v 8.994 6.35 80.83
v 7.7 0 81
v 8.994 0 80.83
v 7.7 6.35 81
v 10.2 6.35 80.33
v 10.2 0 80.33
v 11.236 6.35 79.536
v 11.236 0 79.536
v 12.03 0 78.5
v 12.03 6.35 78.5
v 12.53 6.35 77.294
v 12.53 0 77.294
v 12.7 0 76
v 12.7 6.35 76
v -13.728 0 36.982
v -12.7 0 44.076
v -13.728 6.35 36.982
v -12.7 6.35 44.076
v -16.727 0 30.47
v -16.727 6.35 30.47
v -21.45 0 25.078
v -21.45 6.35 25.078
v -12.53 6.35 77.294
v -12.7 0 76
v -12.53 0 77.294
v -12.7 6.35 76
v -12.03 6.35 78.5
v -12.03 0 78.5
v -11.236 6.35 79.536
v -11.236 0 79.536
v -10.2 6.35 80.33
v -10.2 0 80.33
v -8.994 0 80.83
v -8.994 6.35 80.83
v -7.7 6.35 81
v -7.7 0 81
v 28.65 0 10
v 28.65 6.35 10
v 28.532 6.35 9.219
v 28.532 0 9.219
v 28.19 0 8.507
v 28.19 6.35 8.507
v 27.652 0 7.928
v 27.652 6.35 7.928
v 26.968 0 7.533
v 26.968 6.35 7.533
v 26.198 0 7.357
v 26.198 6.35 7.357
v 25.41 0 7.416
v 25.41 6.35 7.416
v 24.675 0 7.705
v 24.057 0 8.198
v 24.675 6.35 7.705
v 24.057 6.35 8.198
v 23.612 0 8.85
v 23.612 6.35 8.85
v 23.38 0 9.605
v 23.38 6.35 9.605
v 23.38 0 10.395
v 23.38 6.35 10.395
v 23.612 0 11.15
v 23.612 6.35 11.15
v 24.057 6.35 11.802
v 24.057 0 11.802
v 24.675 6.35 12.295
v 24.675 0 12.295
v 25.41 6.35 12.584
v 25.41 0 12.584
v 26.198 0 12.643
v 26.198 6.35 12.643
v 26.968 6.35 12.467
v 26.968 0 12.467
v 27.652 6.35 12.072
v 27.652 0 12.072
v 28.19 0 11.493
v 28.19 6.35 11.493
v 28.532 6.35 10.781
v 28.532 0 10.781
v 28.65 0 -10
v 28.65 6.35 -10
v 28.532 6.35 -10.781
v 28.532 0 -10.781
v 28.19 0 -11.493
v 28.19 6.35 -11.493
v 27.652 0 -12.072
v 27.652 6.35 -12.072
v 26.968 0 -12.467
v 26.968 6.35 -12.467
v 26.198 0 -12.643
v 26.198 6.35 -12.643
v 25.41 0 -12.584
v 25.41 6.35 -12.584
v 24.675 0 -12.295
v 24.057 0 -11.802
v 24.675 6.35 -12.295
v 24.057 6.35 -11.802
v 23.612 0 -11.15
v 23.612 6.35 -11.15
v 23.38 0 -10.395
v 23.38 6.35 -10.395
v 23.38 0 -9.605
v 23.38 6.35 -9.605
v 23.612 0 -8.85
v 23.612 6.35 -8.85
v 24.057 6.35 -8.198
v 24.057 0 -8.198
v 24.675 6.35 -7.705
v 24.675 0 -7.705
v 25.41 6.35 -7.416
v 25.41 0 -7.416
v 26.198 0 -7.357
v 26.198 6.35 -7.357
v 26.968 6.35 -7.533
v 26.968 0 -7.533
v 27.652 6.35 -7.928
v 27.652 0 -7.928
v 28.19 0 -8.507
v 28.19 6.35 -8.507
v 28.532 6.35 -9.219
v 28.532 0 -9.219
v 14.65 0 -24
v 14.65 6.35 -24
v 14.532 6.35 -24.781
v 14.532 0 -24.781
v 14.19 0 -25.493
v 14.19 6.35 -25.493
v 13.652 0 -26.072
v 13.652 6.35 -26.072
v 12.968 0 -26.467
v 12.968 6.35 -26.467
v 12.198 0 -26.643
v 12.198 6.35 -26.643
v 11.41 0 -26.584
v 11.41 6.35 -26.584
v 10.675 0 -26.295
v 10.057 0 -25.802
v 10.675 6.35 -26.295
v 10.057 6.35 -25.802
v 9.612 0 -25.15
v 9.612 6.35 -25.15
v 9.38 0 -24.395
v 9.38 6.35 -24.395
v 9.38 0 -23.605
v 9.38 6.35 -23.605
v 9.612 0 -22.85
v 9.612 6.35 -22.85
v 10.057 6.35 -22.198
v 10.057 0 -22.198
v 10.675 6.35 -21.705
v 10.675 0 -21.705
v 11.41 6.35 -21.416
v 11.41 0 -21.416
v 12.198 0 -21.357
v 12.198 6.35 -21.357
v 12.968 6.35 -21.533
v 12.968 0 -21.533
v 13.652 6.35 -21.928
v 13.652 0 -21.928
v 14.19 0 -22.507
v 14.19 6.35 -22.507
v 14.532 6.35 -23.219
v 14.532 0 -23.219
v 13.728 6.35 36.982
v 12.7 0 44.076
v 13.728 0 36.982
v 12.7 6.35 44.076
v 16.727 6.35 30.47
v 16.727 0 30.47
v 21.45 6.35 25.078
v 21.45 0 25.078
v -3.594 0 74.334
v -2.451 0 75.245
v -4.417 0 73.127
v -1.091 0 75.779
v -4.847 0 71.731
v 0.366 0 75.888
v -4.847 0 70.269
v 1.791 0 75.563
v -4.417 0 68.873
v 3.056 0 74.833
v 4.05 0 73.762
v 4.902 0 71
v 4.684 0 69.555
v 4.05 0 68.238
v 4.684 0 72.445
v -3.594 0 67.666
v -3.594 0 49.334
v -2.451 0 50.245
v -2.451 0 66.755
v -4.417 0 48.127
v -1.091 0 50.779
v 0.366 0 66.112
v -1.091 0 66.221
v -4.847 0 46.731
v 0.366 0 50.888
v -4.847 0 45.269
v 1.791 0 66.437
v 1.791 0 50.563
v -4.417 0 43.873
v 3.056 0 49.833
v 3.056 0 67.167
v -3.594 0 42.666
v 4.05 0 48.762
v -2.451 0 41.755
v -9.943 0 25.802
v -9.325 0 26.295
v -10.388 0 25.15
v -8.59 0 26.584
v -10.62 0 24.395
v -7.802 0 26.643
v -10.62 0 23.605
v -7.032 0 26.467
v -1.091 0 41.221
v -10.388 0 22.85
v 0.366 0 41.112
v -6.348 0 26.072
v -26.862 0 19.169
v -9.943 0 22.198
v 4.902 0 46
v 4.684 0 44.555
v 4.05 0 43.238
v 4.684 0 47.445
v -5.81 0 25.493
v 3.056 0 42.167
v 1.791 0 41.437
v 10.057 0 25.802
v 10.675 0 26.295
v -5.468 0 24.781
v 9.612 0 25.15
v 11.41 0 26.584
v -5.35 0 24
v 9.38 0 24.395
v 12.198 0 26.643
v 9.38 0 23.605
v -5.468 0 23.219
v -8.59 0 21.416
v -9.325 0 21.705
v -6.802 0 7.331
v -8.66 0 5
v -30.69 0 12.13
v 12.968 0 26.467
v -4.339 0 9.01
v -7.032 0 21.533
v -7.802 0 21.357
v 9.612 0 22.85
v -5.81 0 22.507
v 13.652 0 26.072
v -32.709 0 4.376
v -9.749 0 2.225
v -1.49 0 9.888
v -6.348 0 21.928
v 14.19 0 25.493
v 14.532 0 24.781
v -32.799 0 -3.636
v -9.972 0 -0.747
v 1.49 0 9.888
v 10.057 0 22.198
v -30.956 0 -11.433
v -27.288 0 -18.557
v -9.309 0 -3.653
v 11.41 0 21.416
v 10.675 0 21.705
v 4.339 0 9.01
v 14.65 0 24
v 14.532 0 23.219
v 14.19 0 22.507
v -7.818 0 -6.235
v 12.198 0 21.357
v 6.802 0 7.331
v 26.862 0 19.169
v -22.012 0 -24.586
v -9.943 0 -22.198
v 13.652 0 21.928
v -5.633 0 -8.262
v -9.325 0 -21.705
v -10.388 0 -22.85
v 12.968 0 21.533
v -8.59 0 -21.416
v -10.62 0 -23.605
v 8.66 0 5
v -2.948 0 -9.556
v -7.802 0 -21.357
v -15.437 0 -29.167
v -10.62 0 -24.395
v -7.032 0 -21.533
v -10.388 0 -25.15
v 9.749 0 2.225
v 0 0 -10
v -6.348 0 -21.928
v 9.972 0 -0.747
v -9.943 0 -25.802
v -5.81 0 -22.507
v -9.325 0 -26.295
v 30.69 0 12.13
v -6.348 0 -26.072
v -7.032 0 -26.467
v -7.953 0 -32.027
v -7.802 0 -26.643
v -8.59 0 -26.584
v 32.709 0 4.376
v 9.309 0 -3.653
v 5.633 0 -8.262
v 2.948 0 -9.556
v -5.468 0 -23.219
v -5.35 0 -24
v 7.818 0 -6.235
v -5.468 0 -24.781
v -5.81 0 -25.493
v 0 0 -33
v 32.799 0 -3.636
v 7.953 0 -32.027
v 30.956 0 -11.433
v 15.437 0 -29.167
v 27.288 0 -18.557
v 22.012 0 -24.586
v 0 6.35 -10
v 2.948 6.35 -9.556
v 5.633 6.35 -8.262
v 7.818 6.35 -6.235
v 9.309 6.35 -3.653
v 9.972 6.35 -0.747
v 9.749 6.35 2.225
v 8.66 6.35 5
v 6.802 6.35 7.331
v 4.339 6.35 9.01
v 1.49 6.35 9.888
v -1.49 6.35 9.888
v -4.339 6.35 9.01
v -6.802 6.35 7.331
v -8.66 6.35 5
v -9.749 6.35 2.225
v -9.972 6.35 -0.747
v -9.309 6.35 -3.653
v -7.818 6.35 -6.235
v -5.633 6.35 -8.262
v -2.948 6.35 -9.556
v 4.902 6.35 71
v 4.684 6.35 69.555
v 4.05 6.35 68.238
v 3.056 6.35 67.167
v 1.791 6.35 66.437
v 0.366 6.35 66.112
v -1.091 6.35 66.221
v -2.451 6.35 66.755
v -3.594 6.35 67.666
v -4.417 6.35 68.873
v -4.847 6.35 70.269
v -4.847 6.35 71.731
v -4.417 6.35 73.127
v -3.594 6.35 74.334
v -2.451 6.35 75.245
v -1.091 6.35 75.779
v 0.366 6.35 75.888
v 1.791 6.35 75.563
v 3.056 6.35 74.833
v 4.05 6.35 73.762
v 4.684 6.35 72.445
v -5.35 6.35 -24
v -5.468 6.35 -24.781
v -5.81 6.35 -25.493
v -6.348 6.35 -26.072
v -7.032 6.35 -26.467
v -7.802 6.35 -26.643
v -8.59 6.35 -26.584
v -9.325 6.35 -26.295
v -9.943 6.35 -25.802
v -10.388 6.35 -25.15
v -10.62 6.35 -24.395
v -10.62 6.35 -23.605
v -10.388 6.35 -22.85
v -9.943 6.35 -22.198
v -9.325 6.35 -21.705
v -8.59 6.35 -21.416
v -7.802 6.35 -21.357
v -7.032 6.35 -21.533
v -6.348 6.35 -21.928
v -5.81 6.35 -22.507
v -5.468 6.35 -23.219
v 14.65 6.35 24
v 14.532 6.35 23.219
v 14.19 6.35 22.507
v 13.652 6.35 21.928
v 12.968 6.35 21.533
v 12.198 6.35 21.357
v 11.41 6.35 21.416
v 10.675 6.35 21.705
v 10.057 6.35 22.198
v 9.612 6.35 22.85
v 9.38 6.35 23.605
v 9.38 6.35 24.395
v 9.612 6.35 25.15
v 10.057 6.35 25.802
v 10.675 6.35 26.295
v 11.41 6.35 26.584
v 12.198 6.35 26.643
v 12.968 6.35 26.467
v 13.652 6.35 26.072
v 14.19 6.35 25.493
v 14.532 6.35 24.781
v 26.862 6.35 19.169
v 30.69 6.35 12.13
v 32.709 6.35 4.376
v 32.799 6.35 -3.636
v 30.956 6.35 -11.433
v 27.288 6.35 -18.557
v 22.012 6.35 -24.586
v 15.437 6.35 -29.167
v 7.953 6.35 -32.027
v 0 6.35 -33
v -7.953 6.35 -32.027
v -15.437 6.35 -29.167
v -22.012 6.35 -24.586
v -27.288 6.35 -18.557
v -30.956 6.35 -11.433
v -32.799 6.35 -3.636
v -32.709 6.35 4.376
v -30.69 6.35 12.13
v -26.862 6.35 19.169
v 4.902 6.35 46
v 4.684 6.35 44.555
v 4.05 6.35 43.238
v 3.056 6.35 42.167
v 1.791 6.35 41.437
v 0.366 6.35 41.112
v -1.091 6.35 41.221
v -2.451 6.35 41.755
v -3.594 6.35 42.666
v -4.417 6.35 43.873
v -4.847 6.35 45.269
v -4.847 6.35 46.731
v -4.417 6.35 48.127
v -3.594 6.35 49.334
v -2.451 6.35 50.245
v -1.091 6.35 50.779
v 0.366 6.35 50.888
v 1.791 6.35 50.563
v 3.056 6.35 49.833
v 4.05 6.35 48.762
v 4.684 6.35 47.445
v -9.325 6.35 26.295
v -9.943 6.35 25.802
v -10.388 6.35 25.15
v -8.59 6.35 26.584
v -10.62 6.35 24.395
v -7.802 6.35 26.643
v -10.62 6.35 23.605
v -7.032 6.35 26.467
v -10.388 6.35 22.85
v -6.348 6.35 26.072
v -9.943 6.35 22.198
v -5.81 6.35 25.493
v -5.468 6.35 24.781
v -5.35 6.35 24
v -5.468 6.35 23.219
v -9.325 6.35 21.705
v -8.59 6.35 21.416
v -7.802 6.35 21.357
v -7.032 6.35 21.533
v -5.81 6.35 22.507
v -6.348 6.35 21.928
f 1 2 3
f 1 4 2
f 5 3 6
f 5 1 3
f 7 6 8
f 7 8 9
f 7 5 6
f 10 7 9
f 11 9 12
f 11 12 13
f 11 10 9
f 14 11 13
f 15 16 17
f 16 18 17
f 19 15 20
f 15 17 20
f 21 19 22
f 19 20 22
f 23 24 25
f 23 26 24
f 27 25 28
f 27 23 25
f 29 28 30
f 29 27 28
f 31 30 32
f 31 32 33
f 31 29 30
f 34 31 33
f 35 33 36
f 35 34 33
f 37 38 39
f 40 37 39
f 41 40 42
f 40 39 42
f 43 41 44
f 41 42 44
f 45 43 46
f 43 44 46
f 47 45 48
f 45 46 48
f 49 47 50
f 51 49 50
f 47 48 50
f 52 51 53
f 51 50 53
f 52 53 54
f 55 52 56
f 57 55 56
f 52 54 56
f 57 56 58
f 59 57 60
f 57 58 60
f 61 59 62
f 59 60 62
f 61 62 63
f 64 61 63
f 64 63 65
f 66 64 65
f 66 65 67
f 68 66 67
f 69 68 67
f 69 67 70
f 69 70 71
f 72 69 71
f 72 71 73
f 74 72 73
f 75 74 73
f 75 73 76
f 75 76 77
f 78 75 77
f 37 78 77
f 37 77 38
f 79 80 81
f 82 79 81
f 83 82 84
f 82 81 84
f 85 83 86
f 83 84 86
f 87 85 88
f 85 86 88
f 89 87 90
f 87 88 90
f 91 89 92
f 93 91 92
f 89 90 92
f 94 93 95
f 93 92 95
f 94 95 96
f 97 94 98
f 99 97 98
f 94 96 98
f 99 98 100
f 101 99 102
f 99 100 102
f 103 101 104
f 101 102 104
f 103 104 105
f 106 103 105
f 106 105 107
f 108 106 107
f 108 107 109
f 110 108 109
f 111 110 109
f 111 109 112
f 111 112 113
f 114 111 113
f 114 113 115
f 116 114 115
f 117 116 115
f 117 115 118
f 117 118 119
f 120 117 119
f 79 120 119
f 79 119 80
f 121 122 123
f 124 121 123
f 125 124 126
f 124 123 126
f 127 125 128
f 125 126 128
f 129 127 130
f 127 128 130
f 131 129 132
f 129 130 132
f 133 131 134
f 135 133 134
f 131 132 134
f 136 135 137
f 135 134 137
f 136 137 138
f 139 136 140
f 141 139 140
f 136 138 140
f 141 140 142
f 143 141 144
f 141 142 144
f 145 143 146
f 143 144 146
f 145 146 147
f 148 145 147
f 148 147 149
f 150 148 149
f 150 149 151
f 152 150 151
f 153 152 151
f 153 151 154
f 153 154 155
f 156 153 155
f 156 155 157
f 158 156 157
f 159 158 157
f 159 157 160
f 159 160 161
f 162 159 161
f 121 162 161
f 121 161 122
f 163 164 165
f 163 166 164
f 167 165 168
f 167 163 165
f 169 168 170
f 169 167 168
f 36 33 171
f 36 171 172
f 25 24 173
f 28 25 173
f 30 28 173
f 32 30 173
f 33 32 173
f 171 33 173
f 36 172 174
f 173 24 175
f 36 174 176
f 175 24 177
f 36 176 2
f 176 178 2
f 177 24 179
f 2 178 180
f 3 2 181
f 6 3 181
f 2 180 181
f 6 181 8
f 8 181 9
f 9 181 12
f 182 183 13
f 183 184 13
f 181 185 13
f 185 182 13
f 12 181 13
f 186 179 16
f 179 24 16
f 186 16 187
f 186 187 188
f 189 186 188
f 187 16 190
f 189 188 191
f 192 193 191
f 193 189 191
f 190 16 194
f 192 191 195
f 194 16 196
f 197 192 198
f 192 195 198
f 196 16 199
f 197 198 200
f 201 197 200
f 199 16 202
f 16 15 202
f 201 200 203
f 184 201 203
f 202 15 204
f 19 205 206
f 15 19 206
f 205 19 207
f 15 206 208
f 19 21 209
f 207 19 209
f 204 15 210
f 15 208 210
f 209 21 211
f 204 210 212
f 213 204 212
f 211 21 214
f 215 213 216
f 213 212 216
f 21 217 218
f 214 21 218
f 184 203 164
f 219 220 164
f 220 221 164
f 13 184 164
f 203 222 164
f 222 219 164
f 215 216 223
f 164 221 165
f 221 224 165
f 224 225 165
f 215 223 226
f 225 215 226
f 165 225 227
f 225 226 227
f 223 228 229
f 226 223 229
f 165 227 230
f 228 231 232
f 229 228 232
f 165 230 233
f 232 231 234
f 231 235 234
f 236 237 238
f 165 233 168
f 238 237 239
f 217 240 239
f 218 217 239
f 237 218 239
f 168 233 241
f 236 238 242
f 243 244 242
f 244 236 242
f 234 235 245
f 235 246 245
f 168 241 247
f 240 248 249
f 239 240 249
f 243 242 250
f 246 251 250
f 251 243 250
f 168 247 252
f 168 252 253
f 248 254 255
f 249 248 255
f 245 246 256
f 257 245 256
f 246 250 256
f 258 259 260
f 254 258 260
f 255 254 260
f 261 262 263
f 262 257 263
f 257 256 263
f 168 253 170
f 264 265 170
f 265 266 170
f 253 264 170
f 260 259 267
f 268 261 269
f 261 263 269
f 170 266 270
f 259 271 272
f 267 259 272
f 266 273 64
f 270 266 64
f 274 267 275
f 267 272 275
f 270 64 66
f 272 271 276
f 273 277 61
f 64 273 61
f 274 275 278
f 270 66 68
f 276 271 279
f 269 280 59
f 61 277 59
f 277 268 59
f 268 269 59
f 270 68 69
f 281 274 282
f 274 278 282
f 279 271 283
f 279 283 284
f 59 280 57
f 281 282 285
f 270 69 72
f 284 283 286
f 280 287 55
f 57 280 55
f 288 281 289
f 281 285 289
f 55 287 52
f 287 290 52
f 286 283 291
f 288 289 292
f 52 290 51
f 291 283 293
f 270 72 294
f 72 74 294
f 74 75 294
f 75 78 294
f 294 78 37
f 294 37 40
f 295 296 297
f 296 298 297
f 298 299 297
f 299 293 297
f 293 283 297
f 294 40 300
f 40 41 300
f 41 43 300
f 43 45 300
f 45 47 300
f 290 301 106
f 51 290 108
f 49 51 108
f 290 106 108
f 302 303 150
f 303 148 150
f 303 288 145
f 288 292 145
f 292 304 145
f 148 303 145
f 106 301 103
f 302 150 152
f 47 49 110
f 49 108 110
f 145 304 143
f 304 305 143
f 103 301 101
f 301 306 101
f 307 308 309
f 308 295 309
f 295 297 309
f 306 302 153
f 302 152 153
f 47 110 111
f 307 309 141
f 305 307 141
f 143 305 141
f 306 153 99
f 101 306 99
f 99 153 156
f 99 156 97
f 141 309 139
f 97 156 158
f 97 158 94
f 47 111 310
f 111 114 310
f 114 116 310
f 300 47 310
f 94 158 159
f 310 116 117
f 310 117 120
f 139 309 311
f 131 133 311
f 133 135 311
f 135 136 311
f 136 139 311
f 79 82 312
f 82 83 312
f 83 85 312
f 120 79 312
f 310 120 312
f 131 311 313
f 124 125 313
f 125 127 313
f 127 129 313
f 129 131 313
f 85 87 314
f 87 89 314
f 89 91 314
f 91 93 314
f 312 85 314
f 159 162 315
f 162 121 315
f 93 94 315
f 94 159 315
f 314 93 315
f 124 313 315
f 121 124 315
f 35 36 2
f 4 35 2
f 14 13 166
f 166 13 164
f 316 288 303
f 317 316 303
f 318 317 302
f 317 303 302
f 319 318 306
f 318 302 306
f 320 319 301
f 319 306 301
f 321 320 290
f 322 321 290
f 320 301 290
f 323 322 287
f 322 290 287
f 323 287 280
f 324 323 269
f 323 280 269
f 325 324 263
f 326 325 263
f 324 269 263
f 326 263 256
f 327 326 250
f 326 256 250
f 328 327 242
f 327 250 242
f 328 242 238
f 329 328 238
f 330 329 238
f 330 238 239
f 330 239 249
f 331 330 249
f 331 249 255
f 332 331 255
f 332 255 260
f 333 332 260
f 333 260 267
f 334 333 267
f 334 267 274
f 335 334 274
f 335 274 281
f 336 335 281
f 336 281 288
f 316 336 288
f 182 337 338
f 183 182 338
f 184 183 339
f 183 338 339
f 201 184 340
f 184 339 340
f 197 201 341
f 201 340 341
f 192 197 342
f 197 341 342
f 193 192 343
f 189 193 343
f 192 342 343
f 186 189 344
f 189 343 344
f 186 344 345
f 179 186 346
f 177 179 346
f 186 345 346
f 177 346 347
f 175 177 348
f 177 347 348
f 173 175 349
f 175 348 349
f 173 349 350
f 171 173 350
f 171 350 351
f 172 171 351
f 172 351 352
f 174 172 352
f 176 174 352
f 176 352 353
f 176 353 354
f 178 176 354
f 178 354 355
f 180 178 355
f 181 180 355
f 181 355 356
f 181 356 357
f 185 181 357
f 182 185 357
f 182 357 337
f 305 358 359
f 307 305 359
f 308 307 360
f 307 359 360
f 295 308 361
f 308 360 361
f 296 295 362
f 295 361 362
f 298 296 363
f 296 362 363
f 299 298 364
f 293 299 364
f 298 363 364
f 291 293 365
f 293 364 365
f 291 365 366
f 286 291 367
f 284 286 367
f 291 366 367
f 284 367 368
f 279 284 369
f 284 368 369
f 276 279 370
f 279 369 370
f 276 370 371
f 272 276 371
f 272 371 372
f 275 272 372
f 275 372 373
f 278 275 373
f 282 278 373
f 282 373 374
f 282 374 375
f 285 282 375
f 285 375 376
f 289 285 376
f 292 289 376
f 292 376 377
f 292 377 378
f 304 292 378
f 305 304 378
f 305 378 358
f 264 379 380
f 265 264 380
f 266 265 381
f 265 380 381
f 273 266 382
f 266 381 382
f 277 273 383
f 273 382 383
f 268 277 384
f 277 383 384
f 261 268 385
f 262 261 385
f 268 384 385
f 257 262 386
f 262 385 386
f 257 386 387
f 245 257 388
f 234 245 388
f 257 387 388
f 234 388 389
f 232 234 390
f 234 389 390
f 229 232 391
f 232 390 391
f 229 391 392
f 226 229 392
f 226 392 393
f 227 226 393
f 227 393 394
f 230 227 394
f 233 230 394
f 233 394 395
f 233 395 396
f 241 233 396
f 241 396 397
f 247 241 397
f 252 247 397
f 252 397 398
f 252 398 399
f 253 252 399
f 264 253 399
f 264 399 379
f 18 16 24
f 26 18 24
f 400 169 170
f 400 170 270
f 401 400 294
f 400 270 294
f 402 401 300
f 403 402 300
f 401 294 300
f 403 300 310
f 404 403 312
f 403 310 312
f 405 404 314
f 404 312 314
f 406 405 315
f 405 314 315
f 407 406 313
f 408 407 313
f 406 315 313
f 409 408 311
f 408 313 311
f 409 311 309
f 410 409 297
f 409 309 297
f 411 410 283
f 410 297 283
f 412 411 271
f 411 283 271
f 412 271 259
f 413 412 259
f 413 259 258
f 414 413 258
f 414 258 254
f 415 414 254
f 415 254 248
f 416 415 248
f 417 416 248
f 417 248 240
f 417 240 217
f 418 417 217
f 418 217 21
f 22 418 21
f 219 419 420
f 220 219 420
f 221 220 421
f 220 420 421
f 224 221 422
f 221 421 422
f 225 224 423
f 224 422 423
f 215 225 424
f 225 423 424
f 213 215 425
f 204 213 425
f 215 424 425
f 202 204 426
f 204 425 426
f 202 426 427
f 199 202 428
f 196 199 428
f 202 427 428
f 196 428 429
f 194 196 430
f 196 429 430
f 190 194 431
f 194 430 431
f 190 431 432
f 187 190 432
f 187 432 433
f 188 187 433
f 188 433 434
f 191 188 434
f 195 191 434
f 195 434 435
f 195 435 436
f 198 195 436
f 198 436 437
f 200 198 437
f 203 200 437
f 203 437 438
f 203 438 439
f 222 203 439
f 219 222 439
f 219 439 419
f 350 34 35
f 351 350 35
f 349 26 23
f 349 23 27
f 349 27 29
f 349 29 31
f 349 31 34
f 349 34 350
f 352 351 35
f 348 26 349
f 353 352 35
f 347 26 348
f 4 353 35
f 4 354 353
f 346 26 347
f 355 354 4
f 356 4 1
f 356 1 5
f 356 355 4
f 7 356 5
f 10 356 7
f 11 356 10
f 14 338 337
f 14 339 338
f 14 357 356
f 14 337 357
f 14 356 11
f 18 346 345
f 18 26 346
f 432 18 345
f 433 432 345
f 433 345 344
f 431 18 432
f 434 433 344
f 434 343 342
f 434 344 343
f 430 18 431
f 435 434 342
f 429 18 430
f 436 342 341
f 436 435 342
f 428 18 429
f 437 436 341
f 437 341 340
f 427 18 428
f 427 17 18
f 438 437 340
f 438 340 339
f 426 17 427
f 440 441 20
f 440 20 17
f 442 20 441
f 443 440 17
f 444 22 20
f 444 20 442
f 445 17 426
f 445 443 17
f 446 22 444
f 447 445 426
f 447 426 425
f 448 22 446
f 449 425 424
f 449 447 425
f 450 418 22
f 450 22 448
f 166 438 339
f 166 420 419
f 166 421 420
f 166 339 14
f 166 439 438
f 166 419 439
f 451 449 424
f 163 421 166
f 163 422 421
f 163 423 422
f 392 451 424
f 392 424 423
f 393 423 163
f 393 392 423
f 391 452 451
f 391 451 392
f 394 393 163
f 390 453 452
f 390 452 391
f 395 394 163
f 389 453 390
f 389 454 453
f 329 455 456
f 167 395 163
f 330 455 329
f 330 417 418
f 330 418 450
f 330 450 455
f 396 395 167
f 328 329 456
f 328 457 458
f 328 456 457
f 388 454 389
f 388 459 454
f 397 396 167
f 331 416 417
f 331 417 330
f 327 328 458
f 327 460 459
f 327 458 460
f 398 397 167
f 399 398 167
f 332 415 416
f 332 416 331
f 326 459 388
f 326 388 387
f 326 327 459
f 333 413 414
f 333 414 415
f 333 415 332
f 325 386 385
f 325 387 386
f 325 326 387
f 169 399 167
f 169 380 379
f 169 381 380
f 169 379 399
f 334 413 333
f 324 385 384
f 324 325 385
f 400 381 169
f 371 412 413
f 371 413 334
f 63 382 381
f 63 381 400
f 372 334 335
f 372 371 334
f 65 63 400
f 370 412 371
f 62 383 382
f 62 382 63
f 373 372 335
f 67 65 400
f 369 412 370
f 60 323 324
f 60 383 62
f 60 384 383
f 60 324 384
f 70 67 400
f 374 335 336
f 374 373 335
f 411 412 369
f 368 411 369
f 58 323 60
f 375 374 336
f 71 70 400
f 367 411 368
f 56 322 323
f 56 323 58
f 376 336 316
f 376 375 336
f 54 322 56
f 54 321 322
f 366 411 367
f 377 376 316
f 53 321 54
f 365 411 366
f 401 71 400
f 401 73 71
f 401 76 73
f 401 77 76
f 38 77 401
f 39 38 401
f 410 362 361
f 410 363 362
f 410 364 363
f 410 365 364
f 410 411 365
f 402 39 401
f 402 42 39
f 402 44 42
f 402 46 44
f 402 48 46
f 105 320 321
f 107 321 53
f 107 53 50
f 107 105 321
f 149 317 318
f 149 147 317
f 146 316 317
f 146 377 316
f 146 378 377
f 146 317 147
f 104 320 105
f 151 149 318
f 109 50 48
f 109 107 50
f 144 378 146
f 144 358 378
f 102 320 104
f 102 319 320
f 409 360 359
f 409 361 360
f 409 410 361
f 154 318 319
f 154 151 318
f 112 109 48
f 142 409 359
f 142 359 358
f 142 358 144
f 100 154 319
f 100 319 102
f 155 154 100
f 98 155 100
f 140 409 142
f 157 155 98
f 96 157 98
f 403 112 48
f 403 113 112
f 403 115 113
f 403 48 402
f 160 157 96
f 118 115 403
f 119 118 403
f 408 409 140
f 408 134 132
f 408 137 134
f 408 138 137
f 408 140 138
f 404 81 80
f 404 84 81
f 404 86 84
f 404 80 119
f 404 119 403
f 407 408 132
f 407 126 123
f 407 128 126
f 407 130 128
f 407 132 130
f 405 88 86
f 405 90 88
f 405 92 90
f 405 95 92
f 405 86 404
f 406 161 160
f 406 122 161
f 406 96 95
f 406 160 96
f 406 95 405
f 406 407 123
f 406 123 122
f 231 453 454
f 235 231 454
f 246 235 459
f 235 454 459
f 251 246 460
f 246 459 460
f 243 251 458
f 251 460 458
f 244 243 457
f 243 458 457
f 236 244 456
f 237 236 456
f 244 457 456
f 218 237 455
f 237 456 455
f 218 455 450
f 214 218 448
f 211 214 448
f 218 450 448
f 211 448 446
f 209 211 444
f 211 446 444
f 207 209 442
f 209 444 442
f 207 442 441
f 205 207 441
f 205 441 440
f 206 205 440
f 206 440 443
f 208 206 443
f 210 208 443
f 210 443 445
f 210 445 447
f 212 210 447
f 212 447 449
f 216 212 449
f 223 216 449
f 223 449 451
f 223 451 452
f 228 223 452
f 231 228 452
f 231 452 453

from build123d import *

# Parameters (mm, degrees)
BOSS_EXTRUDE1_DEPTH     = 6.35
SKETCH5_R               = 10
CUT_EXTRUDE1_DEPTH      = 88.694483863
F_3_8_CLEARANCE_HOLE1_D = 9.8044
FILLET1_R               = 25
M5_CLEARANCE_HOLE1_D    = 5.3
FILLET2_R               = 5


with BuildPart() as part:
    # Sketch1 → Boss-Extrude1 (new body)
    with BuildSketch(Plane(origin=(0, 0, 0), x_dir=(1, 0, 0), z_dir=(0, 1, 0))):
        with BuildLine():
            Line((-12.7, -81), (12.7, -81))
            Line((12.7, -81), (12.7, -30.458332193))
            ThreePointArc((12.7, -30.458332193), (0, 33), (-12.7, -30.458332193))
            Line((-12.7, -30.458332193), (-12.7, -81))
        make_face()
    extrude(amount=BOSS_EXTRUDE1_DEPTH)

    # Sketch5 → Cut-Extrude1 (cut, through all)
    with BuildSketch(Plane.XZ):
        with Locations(Location((0, 0, 0), (0, 0, 270))):
            Circle(SKETCH5_R)
    extrude(amount=-CUT_EXTRUDE1_DEPTH, mode=Mode.SUBTRACT)

    # 3/8 Clearance Hole1 (through all)
    with Locations(Plane(origin=(0, 0, 0), x_dir=(-1, 0, 0), z_dir=(0, -1, 0))):
        with Locations((0, -46), (0, -71)):
            Hole(F_3_8_CLEARANCE_HOLE1_D / 2)

    # Fillet1
    fillet1_edges = [part.edges().sort_by_distance(p)[0] for p in [
        (-12.7, 3.175, 30.458332193),
        (12.7, 3.175, 30.458332193),
    ]]
    fillet(fillet1_edges, radius=FILLET1_R)

    # M5 Clearance Hole1 (through all)
    with Locations(Plane(origin=(0, 0, 0), x_dir=(-1, 0, 0), z_dir=(0, -1, 0))):
        with Locations((8, 24), (-12, 24), (-26, 10), (-26, -10), (-12, -24), (8, -24)):
            Hole(M5_CLEARANCE_HOLE1_D / 2)

    # Fillet2
    fillet2_edges = [part.edges().sort_by_distance(p)[0] for p in [
        (12.7, 3.175, 81),
        (-12.7, 3.175, 81),
    ]]
    fillet(fillet2_edges, radius=FILLET2_R)


solid = part.part
